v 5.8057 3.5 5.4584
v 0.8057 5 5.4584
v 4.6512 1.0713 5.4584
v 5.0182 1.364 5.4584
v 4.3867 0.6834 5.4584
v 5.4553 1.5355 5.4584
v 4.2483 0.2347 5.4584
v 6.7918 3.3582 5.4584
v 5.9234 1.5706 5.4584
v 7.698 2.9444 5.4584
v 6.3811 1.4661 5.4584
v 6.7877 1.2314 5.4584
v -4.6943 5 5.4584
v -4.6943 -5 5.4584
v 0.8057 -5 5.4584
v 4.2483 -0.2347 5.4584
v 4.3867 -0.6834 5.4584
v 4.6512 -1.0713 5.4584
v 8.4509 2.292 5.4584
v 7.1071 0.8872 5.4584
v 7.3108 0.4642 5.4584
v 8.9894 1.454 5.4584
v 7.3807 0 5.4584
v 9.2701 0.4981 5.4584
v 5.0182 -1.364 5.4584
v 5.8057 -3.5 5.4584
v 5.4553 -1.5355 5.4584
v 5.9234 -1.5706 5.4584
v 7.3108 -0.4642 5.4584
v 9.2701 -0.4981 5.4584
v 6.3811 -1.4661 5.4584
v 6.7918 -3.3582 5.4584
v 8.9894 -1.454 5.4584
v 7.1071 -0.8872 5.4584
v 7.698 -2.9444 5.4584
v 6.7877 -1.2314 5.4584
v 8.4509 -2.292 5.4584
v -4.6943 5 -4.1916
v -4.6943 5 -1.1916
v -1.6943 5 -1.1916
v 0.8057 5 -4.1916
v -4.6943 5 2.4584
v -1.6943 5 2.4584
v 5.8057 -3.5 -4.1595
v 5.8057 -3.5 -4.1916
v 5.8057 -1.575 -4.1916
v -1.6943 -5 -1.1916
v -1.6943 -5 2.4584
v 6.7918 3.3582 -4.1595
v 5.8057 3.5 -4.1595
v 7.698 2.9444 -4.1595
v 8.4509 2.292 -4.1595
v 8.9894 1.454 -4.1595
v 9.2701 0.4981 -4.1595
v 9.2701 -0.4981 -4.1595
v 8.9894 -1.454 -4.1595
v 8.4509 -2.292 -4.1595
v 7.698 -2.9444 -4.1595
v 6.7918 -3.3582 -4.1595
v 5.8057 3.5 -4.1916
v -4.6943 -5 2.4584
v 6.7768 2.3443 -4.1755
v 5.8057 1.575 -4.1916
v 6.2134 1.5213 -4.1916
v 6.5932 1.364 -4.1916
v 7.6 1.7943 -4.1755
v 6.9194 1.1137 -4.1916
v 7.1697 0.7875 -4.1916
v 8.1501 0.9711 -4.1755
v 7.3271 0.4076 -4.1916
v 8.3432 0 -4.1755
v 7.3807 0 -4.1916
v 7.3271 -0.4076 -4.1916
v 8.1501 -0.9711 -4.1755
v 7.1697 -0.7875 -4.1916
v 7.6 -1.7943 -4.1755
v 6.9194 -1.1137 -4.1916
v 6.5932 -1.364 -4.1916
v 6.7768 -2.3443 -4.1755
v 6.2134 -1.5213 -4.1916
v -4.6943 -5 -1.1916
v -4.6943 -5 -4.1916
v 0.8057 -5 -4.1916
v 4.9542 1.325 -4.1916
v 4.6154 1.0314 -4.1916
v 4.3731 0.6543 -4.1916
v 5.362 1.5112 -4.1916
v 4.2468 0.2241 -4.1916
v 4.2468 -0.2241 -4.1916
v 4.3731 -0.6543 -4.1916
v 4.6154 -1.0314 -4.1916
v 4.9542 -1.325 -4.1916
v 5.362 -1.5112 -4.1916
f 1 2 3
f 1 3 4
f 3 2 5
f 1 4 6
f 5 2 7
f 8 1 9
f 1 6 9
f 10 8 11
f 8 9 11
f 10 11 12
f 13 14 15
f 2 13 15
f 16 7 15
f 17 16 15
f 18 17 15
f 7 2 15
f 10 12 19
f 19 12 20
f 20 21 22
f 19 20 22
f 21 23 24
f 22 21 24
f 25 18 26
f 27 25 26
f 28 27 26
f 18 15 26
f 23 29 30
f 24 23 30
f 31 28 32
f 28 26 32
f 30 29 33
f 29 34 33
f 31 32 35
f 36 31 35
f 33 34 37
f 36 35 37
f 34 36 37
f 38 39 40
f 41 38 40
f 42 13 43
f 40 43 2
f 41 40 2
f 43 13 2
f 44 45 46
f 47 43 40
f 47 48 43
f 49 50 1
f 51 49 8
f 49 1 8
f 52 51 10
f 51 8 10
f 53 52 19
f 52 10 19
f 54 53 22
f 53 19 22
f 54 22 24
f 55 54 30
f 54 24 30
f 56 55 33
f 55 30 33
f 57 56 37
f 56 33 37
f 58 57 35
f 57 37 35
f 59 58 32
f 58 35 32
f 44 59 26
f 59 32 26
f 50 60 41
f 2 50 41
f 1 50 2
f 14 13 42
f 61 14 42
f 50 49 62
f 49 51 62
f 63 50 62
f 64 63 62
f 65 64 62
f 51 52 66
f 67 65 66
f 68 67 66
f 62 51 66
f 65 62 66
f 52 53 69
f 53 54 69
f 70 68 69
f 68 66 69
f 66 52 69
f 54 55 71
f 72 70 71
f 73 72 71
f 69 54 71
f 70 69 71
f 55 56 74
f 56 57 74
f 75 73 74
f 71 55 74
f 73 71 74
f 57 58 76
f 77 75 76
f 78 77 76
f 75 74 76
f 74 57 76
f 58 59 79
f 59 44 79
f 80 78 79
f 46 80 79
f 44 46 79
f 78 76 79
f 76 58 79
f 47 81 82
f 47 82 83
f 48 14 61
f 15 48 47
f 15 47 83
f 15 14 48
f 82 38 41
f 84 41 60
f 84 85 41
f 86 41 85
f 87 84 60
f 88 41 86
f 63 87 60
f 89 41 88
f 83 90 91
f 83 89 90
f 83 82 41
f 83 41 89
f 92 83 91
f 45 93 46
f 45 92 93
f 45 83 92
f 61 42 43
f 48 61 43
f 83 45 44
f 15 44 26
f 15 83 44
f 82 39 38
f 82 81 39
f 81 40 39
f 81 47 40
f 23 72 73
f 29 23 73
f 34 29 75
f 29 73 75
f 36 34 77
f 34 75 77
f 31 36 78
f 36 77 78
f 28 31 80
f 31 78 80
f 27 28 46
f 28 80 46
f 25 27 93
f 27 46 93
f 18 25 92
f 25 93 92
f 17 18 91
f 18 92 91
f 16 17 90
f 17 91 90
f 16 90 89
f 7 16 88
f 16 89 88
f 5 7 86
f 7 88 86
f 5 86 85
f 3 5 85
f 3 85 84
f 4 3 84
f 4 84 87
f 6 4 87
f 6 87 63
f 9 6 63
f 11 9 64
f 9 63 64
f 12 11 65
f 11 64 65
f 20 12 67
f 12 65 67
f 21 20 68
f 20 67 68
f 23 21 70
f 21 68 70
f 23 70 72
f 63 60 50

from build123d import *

# Parameters (mm, degrees)
F1_DEPTH = 5
F0_W     = 4
F0_H     = 9.65
F2_DEPTH = 5
F3_SIZE2 = 5
F3_SIZE  = 1.5
F4_SIZE2 = 1.5
F4_SIZE  = 5
F0_W_2   = 1.575


with BuildPart() as f1:
    # F0 (on Front) → F1 (new body, symmetric)
    with BuildSketch(Plane.XZ):
        Polygon((-4.6942626456, -1.1915529846), (-4.6942626456, -4.1915529846), (1.8057373544, -4.1915529846), (1.8057373544, 5.4584470154), (-4.6942626456, 5.4584470154), (-4.6942626456, 2.4584470154), (-1.6942626456, 2.4584470154), (-1.6942626456, -1.1915529846), align=None)
    extrude(amount=F1_DEPTH, both=True)

    # F0 (on Front) → F2 (join, symmetric)
    with BuildSketch(Plane.XZ):
        with Locations((3.8057373544, 0.6334470154)):
            Rectangle(F0_W, F0_H)
    extrude(amount=F2_DEPTH, both=True)

    # F3
    f3_edges = [f1.edges().sort_by_distance(p)[0] for p in [
        (5.805737, -5, 0.633447),
    ]]
    f3_side = f1.faces().sort_by_distance((5.805737, 0, 0.633447))[0]
    chamfer(f3_edges, length=F3_SIZE, length2=F3_SIZE2, reference=f3_side)

    # F4
    f4_edges = [f1.edges().sort_by_distance(p)[0] for p in [
        (5.805737, 5, 0.633447),
    ]]
    f4_side = f1.faces().sort_by_distance((1.010094, 5, 0.633447))[0]
    chamfer(f4_edges, length=F4_SIZE, length2=F4_SIZE2, reference=f4_side)

    # F0 (on Front) → F5 (revolve, cut)
    with BuildSketch(Plane.XZ):
        with Locations((6.5932373544, 0.6334470154)):
            Rectangle(F0_W_2, F0_H)
    revolve(axis=Axis((5.8057373544, 0, 0.6334470154), (0, 0, -1)), mode=Mode.SUBTRACT)

    # F0 (on Front) → F6 (revolve)
    with BuildSketch(Plane.XZ):
        Polygon((7.3807373544, 5.4584470154), (7.3807373544, -4.1915529846), (9.3057373544, -4.159483593), (9.3057373544, 5.4584470154), align=None)
    revolve(axis=Axis((5.8057373544, 0, 0.6334470154), (0, 0, -1)))


solid = f1.part
